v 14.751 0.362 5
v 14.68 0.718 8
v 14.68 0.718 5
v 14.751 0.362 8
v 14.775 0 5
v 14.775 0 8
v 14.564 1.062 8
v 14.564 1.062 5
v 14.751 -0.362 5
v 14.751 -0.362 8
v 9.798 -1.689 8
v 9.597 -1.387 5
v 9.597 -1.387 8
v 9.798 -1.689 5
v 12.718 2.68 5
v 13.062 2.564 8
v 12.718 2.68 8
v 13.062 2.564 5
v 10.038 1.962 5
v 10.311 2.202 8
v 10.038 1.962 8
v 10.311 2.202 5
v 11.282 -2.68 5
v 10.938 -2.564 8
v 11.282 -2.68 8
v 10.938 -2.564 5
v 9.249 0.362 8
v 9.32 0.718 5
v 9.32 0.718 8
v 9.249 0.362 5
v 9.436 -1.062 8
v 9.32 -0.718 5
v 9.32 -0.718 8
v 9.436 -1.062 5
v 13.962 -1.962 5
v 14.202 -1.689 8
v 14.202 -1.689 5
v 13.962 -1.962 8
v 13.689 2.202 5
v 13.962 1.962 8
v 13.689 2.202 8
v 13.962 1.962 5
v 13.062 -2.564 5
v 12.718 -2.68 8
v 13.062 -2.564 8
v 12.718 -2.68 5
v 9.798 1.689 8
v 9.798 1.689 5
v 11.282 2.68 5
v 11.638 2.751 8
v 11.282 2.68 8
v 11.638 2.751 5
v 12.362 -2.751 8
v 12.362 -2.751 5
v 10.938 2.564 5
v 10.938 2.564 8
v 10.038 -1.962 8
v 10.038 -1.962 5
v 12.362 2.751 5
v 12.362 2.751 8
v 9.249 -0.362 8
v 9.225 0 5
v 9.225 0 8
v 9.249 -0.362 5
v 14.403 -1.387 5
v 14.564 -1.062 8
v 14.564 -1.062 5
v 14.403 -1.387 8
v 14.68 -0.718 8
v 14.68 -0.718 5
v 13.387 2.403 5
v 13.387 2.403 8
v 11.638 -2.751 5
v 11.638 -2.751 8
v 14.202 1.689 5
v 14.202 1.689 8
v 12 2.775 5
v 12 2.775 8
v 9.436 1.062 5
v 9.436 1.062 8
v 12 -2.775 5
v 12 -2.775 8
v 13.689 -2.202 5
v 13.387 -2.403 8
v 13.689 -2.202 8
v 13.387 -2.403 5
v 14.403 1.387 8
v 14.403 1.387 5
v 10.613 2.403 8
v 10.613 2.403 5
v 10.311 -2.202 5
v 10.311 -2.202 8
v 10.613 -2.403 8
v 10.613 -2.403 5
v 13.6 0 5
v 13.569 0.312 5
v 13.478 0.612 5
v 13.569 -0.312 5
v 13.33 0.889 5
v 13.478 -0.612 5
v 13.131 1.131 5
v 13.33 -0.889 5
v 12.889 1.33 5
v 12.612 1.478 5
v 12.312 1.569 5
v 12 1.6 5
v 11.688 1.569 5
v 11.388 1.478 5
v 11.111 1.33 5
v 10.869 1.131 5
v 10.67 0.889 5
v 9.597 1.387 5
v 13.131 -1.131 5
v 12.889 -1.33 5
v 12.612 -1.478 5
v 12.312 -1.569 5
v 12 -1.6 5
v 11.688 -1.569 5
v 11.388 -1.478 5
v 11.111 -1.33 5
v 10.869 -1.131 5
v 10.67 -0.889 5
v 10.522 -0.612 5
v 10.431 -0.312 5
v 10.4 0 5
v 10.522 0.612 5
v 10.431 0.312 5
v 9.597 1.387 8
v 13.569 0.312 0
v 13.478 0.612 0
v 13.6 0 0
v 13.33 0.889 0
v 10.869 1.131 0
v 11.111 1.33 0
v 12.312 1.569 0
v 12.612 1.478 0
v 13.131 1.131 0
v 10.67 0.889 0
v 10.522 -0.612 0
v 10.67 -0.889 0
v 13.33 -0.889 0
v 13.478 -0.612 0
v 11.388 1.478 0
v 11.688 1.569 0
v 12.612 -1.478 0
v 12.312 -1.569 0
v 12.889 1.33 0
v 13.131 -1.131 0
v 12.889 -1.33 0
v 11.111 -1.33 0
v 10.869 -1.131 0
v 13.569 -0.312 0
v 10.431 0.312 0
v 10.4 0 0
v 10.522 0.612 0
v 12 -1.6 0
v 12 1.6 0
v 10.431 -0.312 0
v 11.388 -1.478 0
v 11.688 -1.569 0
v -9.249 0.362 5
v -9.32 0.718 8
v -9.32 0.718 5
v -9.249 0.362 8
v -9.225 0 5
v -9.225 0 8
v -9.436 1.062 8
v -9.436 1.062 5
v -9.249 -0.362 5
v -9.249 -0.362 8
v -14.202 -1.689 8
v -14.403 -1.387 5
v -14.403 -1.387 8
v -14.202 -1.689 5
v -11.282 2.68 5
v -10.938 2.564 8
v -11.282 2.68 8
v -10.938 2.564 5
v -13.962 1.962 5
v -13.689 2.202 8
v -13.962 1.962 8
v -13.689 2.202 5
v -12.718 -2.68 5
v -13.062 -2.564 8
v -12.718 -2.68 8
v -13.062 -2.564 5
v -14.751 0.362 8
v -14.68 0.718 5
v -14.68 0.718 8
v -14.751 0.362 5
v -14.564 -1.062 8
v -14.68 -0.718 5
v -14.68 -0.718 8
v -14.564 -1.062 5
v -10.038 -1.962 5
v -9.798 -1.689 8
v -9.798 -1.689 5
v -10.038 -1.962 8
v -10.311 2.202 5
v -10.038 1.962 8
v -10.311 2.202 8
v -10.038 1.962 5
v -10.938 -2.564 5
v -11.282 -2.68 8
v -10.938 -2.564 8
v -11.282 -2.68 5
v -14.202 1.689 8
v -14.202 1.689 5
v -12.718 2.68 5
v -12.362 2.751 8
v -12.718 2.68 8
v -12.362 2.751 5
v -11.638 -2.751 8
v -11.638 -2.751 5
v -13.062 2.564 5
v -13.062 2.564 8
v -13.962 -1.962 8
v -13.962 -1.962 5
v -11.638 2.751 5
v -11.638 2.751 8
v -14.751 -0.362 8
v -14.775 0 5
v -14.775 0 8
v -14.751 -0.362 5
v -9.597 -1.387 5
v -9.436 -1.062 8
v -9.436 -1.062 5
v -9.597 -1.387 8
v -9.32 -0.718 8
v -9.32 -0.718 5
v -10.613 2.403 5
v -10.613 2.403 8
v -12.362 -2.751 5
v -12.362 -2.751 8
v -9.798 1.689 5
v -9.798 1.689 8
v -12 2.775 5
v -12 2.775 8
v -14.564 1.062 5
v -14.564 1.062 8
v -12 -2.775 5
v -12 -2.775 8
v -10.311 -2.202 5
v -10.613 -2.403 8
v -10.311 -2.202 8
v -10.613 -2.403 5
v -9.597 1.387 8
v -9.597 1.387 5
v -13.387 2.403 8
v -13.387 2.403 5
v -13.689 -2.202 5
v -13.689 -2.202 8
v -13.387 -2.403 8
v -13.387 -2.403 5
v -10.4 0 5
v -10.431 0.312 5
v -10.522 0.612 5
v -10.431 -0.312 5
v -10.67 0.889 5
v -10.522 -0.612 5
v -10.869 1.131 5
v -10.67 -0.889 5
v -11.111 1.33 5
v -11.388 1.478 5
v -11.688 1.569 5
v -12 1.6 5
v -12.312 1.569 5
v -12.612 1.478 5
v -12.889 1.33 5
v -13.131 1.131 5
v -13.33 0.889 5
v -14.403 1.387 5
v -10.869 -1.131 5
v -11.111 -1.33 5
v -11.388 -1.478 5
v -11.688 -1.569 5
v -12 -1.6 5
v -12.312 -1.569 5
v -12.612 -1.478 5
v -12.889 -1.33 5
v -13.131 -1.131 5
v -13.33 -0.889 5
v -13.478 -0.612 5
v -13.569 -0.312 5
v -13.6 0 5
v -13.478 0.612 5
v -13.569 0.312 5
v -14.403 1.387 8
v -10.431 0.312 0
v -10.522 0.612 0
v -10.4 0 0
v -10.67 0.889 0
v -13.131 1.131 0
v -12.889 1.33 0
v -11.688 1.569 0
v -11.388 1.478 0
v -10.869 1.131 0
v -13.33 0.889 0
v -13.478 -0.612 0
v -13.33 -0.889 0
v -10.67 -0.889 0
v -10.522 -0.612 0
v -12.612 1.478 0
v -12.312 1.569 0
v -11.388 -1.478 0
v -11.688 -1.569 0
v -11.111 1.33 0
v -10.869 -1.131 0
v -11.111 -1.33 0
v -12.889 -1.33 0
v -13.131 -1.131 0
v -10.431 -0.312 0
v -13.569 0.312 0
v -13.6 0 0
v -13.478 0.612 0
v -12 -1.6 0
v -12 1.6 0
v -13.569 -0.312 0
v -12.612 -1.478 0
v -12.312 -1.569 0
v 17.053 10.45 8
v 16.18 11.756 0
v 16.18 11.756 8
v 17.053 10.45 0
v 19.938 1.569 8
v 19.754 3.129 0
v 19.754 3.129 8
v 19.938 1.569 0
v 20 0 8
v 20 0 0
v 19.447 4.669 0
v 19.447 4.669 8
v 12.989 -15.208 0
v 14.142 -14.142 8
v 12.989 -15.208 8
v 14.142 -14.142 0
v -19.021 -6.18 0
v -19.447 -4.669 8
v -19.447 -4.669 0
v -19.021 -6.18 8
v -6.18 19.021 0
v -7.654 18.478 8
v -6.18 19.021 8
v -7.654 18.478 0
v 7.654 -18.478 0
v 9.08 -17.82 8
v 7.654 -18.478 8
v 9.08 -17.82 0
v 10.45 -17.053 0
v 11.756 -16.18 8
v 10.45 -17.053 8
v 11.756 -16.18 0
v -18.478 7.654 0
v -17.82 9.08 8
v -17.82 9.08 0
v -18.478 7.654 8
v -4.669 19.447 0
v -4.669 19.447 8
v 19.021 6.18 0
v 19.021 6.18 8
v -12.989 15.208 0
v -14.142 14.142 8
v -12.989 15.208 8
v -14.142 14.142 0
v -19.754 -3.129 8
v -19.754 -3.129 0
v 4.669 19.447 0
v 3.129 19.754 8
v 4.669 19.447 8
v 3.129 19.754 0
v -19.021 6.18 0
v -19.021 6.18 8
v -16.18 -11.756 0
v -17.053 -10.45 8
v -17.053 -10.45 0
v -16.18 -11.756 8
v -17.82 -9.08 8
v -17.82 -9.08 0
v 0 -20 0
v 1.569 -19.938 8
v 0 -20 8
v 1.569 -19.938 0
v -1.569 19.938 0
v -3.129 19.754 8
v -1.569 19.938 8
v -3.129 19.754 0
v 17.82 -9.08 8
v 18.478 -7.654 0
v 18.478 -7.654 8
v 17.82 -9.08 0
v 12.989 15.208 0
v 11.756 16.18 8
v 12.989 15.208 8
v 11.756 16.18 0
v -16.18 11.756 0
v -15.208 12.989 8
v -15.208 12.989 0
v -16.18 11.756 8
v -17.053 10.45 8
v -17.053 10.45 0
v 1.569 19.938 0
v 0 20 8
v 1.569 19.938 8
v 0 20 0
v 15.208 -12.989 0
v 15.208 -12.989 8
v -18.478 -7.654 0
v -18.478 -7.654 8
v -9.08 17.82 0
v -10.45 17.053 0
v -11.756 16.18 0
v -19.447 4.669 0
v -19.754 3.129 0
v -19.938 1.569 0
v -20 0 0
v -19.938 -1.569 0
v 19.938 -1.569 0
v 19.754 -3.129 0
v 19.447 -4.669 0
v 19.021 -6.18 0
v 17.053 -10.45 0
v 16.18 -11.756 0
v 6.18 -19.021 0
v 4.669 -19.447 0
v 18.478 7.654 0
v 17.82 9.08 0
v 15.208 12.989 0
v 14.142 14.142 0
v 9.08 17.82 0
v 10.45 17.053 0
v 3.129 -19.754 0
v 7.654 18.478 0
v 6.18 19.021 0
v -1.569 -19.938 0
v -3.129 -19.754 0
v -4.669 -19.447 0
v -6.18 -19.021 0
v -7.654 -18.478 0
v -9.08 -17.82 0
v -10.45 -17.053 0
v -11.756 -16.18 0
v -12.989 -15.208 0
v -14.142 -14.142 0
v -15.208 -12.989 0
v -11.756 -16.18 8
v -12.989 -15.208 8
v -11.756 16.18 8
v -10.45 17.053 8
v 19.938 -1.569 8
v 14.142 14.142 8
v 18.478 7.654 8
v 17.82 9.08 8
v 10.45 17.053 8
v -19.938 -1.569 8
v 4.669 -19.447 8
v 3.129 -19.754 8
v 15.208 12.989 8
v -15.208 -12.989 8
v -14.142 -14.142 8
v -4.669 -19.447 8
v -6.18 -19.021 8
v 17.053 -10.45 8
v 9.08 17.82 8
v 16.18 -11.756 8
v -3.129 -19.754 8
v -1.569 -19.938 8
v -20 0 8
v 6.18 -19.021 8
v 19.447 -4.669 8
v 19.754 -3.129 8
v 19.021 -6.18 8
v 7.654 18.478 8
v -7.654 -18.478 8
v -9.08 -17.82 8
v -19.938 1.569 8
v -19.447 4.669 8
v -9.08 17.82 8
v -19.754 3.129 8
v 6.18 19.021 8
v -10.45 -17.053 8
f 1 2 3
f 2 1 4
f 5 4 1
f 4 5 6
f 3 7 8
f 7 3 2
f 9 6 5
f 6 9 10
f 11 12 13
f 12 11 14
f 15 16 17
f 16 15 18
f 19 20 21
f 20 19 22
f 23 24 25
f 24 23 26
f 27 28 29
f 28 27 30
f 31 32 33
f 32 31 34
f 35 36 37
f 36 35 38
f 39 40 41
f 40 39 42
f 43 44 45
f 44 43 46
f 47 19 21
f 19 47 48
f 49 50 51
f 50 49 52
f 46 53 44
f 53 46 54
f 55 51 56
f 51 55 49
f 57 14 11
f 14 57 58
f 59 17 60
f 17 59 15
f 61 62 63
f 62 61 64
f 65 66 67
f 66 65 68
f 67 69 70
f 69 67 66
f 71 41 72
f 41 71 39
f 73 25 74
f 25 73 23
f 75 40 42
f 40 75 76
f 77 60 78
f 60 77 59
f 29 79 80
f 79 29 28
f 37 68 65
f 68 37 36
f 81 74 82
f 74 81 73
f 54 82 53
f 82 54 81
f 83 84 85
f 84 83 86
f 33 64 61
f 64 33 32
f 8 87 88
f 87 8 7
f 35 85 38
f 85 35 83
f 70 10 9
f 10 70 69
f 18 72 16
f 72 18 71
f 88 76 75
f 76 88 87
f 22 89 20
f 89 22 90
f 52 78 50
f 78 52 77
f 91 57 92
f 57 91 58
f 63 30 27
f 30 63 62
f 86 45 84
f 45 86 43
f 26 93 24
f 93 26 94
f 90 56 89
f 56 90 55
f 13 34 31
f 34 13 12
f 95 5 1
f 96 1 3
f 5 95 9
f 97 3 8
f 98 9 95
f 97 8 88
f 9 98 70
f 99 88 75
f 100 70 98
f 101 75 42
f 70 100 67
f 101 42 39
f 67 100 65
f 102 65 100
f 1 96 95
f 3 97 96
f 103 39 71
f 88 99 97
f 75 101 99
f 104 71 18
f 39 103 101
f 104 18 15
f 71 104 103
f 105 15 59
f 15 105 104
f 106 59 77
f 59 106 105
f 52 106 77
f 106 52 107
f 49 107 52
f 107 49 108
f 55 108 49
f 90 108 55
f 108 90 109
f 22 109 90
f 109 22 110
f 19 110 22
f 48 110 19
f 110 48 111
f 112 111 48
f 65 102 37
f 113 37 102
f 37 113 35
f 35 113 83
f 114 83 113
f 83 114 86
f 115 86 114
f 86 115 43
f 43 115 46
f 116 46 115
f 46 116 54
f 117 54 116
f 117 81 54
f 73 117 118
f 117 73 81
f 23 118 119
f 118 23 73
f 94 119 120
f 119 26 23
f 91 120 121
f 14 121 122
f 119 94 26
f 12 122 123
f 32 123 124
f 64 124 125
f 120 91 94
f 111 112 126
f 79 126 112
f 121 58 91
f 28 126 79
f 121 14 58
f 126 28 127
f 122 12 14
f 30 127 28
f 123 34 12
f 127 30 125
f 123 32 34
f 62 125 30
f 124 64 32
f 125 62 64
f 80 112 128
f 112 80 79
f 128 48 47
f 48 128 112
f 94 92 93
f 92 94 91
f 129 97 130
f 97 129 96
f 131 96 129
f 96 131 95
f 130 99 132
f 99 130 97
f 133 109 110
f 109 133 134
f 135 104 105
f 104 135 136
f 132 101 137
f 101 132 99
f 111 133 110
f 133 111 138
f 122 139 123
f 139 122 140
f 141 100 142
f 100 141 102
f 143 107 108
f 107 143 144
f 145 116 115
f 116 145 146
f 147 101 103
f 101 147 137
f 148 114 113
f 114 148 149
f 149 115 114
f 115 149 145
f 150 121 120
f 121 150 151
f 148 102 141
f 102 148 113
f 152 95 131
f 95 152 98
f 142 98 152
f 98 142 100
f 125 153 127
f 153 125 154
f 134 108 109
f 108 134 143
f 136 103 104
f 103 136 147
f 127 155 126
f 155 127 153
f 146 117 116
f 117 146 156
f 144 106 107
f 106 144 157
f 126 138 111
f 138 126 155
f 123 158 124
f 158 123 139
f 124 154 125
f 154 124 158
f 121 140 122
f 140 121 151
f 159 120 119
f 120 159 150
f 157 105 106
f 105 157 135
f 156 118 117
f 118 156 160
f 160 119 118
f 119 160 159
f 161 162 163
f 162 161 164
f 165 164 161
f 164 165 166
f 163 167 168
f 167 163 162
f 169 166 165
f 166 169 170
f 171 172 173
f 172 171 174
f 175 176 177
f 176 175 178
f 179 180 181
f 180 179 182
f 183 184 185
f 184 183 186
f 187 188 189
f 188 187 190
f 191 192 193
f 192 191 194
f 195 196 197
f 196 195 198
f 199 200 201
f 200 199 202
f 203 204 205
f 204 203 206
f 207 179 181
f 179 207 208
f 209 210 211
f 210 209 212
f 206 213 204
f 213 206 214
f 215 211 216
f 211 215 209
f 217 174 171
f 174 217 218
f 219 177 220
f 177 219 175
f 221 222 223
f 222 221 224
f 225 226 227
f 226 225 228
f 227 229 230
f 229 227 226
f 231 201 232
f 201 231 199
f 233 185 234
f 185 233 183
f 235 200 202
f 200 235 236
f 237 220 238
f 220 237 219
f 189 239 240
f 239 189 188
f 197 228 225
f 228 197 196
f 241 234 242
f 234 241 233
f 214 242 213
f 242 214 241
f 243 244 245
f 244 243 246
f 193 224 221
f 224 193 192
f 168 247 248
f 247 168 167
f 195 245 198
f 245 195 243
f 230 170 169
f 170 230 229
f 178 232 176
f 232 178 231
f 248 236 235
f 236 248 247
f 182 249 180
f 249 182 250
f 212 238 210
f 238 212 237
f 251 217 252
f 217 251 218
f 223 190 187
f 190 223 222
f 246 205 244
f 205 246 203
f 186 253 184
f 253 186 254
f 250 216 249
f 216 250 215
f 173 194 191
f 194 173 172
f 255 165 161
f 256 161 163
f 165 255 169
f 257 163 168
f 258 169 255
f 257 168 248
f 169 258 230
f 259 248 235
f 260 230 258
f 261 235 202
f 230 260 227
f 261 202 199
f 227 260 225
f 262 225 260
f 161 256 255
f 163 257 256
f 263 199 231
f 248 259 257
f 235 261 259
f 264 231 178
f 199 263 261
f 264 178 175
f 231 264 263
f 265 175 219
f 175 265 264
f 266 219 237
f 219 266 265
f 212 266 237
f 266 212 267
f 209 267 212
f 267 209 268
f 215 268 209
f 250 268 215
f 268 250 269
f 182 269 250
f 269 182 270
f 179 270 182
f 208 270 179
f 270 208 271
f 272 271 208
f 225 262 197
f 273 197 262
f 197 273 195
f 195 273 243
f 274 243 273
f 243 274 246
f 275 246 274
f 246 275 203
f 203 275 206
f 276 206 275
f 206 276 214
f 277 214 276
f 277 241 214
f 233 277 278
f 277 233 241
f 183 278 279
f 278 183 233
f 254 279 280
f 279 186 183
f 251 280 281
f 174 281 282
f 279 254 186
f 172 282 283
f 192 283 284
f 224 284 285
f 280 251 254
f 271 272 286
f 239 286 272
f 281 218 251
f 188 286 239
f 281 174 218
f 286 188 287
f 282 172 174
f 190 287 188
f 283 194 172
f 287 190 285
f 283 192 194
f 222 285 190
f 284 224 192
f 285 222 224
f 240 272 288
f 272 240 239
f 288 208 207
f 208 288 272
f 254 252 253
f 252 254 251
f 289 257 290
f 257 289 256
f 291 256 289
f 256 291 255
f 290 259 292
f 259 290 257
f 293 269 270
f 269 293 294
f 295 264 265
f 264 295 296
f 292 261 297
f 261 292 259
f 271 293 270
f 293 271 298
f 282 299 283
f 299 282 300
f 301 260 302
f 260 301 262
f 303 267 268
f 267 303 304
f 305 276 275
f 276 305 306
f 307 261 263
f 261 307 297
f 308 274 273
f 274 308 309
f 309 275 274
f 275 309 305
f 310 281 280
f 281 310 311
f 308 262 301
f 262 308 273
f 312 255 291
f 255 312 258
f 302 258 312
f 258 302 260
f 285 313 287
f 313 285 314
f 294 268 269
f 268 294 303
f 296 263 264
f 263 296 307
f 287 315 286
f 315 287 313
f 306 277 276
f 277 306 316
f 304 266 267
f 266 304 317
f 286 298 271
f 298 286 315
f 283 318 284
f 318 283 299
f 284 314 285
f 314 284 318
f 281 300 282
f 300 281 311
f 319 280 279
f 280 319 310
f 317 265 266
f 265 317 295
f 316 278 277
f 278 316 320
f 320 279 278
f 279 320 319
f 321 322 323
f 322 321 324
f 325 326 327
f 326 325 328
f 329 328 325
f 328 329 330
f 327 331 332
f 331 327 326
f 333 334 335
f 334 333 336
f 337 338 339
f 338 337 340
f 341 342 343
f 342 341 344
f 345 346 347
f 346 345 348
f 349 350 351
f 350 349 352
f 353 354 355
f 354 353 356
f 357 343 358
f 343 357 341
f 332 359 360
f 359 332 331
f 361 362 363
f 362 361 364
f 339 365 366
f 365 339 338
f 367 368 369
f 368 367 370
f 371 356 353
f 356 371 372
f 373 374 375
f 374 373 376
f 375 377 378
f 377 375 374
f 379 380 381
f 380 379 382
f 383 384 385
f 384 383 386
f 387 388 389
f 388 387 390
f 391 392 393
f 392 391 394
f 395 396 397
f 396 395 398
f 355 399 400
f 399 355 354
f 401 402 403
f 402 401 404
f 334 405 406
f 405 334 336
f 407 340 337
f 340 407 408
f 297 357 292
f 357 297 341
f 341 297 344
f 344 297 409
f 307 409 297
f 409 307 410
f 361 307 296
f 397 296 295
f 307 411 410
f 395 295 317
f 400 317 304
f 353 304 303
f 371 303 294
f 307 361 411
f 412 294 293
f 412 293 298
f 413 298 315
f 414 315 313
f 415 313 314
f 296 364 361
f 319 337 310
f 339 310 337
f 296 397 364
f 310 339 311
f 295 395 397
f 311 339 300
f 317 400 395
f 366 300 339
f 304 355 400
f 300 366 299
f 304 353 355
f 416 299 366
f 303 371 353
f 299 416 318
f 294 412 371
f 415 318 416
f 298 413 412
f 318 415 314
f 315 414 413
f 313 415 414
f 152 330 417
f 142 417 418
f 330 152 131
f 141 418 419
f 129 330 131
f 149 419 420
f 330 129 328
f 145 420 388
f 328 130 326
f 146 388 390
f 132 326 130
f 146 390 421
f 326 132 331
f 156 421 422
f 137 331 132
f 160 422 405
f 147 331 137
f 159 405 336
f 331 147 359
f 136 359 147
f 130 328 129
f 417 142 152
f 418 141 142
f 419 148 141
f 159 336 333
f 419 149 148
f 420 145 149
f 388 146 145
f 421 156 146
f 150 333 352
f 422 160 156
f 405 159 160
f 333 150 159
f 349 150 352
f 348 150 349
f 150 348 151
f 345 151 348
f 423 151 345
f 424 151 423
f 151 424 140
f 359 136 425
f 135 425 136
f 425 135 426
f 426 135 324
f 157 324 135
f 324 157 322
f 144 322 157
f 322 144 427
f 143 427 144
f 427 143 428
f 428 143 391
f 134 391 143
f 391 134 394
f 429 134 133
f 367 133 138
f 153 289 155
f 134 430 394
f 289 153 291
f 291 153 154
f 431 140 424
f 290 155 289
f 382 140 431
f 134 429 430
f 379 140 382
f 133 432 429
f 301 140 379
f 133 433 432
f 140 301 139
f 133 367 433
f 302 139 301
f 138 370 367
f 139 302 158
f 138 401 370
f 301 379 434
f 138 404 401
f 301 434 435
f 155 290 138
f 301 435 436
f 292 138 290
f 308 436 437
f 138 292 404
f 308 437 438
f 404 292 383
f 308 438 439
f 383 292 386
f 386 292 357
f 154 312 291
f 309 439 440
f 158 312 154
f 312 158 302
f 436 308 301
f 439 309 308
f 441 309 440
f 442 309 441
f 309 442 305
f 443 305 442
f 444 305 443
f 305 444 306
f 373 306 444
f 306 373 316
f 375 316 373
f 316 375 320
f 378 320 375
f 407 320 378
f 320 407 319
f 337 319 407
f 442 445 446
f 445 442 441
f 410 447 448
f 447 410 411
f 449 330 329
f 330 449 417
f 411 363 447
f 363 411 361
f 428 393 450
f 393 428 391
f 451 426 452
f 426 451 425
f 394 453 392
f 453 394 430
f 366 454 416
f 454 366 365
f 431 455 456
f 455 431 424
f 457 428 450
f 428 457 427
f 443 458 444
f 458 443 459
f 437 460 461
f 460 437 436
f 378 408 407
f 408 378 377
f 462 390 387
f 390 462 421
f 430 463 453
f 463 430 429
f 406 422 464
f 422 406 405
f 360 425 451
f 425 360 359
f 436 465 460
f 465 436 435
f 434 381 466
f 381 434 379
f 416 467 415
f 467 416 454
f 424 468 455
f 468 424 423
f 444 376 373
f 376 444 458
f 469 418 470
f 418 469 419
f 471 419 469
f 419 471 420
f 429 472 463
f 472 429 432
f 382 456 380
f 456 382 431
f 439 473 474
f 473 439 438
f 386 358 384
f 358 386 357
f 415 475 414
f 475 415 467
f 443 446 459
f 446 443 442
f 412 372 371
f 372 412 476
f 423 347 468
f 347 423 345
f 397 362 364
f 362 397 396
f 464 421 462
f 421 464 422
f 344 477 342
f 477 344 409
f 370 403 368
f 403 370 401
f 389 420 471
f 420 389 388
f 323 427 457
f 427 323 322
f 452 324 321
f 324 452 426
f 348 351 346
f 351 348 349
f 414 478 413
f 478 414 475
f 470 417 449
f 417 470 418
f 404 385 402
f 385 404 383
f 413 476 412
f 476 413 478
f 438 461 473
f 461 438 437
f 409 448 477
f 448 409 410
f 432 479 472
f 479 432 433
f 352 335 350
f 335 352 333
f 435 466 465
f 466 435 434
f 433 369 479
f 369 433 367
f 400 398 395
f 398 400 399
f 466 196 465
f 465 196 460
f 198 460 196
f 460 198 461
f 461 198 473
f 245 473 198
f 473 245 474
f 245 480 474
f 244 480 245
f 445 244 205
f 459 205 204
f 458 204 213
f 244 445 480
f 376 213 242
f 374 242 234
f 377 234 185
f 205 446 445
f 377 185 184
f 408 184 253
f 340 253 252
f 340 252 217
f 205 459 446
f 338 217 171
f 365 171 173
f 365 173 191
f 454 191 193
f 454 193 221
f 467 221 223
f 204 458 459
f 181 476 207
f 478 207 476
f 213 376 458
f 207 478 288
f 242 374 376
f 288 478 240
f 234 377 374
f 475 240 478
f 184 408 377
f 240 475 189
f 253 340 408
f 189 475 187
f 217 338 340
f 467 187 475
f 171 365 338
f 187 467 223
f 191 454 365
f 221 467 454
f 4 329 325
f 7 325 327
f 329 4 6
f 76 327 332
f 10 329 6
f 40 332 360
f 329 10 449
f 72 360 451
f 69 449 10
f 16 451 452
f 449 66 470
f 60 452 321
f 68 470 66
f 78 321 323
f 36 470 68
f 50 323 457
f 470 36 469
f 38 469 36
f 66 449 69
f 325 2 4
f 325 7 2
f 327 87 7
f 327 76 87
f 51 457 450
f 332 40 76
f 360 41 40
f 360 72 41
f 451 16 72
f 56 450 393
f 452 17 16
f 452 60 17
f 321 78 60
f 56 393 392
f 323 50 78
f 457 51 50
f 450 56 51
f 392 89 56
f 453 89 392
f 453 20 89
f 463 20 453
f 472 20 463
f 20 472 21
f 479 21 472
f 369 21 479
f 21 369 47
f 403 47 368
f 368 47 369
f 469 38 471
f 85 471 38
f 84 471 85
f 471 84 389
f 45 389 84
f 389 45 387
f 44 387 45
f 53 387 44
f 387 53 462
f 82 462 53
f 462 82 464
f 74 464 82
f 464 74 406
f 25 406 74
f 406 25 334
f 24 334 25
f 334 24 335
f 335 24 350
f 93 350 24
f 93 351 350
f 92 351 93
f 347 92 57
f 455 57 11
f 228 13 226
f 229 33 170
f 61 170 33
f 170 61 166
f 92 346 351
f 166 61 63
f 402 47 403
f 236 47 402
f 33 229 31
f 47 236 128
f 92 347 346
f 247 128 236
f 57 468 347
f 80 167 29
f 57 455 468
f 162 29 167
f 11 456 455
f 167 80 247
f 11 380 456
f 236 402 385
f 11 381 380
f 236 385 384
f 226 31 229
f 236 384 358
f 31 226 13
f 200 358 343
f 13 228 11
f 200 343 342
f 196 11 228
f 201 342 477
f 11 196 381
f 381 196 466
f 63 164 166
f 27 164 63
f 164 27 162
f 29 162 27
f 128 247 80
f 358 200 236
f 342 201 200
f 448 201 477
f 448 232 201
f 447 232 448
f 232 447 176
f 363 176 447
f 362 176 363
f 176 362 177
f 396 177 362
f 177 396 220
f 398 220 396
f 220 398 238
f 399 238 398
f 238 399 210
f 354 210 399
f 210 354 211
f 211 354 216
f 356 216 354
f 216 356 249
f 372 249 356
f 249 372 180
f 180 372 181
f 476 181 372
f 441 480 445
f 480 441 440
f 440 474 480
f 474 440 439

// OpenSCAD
// Cap with counterbored bolt holes
// Bolt head recess: 5.5 mm diameter, 3 mm deep (per measured bolt)

// --- Cap dimensions (adjust to match your part) ---
cap_diameter = 40;
cap_height = 8;

// --- Bolt hole layout (adjust positions/count for your cap) ---
bolt_positions = [
    [12, 0],
    [-12, 0],
];

// --- Bolt / counterbore dimensions ---
counterbore_diameter = 5.5;   // bolt head OD
counterbore_depth = 3;        // bolt head height
through_hole_diameter = 3.2;  // M3 clearance (adjust if not M3)

// Small clearance so the head seats without binding
head_clearance = 0.05;

module counterbored_bolt_hole() {
    // Recess on top face for bolt head
    translate([0, 0, cap_height - counterbore_depth])
        cylinder(
            h = counterbore_depth + 0.01,
            d = counterbore_diameter + head_clearance,
            center = false,
            $fn = 48
        );

    // Through-hole for shank
    translate([0, 0, -0.01])
        cylinder(
            h = cap_height + 0.02,
            d = through_hole_diameter,
            center = false,
            $fn = 32
        );
}

module cap_body() {
    difference() {
        cylinder(h = cap_height, d = cap_diameter, $fn = 80);

        for (pos = bolt_positions) {
            translate([pos[0], pos[1], 0])
                counterbored_bolt_hole();
        }
    }
}

cap_body();
